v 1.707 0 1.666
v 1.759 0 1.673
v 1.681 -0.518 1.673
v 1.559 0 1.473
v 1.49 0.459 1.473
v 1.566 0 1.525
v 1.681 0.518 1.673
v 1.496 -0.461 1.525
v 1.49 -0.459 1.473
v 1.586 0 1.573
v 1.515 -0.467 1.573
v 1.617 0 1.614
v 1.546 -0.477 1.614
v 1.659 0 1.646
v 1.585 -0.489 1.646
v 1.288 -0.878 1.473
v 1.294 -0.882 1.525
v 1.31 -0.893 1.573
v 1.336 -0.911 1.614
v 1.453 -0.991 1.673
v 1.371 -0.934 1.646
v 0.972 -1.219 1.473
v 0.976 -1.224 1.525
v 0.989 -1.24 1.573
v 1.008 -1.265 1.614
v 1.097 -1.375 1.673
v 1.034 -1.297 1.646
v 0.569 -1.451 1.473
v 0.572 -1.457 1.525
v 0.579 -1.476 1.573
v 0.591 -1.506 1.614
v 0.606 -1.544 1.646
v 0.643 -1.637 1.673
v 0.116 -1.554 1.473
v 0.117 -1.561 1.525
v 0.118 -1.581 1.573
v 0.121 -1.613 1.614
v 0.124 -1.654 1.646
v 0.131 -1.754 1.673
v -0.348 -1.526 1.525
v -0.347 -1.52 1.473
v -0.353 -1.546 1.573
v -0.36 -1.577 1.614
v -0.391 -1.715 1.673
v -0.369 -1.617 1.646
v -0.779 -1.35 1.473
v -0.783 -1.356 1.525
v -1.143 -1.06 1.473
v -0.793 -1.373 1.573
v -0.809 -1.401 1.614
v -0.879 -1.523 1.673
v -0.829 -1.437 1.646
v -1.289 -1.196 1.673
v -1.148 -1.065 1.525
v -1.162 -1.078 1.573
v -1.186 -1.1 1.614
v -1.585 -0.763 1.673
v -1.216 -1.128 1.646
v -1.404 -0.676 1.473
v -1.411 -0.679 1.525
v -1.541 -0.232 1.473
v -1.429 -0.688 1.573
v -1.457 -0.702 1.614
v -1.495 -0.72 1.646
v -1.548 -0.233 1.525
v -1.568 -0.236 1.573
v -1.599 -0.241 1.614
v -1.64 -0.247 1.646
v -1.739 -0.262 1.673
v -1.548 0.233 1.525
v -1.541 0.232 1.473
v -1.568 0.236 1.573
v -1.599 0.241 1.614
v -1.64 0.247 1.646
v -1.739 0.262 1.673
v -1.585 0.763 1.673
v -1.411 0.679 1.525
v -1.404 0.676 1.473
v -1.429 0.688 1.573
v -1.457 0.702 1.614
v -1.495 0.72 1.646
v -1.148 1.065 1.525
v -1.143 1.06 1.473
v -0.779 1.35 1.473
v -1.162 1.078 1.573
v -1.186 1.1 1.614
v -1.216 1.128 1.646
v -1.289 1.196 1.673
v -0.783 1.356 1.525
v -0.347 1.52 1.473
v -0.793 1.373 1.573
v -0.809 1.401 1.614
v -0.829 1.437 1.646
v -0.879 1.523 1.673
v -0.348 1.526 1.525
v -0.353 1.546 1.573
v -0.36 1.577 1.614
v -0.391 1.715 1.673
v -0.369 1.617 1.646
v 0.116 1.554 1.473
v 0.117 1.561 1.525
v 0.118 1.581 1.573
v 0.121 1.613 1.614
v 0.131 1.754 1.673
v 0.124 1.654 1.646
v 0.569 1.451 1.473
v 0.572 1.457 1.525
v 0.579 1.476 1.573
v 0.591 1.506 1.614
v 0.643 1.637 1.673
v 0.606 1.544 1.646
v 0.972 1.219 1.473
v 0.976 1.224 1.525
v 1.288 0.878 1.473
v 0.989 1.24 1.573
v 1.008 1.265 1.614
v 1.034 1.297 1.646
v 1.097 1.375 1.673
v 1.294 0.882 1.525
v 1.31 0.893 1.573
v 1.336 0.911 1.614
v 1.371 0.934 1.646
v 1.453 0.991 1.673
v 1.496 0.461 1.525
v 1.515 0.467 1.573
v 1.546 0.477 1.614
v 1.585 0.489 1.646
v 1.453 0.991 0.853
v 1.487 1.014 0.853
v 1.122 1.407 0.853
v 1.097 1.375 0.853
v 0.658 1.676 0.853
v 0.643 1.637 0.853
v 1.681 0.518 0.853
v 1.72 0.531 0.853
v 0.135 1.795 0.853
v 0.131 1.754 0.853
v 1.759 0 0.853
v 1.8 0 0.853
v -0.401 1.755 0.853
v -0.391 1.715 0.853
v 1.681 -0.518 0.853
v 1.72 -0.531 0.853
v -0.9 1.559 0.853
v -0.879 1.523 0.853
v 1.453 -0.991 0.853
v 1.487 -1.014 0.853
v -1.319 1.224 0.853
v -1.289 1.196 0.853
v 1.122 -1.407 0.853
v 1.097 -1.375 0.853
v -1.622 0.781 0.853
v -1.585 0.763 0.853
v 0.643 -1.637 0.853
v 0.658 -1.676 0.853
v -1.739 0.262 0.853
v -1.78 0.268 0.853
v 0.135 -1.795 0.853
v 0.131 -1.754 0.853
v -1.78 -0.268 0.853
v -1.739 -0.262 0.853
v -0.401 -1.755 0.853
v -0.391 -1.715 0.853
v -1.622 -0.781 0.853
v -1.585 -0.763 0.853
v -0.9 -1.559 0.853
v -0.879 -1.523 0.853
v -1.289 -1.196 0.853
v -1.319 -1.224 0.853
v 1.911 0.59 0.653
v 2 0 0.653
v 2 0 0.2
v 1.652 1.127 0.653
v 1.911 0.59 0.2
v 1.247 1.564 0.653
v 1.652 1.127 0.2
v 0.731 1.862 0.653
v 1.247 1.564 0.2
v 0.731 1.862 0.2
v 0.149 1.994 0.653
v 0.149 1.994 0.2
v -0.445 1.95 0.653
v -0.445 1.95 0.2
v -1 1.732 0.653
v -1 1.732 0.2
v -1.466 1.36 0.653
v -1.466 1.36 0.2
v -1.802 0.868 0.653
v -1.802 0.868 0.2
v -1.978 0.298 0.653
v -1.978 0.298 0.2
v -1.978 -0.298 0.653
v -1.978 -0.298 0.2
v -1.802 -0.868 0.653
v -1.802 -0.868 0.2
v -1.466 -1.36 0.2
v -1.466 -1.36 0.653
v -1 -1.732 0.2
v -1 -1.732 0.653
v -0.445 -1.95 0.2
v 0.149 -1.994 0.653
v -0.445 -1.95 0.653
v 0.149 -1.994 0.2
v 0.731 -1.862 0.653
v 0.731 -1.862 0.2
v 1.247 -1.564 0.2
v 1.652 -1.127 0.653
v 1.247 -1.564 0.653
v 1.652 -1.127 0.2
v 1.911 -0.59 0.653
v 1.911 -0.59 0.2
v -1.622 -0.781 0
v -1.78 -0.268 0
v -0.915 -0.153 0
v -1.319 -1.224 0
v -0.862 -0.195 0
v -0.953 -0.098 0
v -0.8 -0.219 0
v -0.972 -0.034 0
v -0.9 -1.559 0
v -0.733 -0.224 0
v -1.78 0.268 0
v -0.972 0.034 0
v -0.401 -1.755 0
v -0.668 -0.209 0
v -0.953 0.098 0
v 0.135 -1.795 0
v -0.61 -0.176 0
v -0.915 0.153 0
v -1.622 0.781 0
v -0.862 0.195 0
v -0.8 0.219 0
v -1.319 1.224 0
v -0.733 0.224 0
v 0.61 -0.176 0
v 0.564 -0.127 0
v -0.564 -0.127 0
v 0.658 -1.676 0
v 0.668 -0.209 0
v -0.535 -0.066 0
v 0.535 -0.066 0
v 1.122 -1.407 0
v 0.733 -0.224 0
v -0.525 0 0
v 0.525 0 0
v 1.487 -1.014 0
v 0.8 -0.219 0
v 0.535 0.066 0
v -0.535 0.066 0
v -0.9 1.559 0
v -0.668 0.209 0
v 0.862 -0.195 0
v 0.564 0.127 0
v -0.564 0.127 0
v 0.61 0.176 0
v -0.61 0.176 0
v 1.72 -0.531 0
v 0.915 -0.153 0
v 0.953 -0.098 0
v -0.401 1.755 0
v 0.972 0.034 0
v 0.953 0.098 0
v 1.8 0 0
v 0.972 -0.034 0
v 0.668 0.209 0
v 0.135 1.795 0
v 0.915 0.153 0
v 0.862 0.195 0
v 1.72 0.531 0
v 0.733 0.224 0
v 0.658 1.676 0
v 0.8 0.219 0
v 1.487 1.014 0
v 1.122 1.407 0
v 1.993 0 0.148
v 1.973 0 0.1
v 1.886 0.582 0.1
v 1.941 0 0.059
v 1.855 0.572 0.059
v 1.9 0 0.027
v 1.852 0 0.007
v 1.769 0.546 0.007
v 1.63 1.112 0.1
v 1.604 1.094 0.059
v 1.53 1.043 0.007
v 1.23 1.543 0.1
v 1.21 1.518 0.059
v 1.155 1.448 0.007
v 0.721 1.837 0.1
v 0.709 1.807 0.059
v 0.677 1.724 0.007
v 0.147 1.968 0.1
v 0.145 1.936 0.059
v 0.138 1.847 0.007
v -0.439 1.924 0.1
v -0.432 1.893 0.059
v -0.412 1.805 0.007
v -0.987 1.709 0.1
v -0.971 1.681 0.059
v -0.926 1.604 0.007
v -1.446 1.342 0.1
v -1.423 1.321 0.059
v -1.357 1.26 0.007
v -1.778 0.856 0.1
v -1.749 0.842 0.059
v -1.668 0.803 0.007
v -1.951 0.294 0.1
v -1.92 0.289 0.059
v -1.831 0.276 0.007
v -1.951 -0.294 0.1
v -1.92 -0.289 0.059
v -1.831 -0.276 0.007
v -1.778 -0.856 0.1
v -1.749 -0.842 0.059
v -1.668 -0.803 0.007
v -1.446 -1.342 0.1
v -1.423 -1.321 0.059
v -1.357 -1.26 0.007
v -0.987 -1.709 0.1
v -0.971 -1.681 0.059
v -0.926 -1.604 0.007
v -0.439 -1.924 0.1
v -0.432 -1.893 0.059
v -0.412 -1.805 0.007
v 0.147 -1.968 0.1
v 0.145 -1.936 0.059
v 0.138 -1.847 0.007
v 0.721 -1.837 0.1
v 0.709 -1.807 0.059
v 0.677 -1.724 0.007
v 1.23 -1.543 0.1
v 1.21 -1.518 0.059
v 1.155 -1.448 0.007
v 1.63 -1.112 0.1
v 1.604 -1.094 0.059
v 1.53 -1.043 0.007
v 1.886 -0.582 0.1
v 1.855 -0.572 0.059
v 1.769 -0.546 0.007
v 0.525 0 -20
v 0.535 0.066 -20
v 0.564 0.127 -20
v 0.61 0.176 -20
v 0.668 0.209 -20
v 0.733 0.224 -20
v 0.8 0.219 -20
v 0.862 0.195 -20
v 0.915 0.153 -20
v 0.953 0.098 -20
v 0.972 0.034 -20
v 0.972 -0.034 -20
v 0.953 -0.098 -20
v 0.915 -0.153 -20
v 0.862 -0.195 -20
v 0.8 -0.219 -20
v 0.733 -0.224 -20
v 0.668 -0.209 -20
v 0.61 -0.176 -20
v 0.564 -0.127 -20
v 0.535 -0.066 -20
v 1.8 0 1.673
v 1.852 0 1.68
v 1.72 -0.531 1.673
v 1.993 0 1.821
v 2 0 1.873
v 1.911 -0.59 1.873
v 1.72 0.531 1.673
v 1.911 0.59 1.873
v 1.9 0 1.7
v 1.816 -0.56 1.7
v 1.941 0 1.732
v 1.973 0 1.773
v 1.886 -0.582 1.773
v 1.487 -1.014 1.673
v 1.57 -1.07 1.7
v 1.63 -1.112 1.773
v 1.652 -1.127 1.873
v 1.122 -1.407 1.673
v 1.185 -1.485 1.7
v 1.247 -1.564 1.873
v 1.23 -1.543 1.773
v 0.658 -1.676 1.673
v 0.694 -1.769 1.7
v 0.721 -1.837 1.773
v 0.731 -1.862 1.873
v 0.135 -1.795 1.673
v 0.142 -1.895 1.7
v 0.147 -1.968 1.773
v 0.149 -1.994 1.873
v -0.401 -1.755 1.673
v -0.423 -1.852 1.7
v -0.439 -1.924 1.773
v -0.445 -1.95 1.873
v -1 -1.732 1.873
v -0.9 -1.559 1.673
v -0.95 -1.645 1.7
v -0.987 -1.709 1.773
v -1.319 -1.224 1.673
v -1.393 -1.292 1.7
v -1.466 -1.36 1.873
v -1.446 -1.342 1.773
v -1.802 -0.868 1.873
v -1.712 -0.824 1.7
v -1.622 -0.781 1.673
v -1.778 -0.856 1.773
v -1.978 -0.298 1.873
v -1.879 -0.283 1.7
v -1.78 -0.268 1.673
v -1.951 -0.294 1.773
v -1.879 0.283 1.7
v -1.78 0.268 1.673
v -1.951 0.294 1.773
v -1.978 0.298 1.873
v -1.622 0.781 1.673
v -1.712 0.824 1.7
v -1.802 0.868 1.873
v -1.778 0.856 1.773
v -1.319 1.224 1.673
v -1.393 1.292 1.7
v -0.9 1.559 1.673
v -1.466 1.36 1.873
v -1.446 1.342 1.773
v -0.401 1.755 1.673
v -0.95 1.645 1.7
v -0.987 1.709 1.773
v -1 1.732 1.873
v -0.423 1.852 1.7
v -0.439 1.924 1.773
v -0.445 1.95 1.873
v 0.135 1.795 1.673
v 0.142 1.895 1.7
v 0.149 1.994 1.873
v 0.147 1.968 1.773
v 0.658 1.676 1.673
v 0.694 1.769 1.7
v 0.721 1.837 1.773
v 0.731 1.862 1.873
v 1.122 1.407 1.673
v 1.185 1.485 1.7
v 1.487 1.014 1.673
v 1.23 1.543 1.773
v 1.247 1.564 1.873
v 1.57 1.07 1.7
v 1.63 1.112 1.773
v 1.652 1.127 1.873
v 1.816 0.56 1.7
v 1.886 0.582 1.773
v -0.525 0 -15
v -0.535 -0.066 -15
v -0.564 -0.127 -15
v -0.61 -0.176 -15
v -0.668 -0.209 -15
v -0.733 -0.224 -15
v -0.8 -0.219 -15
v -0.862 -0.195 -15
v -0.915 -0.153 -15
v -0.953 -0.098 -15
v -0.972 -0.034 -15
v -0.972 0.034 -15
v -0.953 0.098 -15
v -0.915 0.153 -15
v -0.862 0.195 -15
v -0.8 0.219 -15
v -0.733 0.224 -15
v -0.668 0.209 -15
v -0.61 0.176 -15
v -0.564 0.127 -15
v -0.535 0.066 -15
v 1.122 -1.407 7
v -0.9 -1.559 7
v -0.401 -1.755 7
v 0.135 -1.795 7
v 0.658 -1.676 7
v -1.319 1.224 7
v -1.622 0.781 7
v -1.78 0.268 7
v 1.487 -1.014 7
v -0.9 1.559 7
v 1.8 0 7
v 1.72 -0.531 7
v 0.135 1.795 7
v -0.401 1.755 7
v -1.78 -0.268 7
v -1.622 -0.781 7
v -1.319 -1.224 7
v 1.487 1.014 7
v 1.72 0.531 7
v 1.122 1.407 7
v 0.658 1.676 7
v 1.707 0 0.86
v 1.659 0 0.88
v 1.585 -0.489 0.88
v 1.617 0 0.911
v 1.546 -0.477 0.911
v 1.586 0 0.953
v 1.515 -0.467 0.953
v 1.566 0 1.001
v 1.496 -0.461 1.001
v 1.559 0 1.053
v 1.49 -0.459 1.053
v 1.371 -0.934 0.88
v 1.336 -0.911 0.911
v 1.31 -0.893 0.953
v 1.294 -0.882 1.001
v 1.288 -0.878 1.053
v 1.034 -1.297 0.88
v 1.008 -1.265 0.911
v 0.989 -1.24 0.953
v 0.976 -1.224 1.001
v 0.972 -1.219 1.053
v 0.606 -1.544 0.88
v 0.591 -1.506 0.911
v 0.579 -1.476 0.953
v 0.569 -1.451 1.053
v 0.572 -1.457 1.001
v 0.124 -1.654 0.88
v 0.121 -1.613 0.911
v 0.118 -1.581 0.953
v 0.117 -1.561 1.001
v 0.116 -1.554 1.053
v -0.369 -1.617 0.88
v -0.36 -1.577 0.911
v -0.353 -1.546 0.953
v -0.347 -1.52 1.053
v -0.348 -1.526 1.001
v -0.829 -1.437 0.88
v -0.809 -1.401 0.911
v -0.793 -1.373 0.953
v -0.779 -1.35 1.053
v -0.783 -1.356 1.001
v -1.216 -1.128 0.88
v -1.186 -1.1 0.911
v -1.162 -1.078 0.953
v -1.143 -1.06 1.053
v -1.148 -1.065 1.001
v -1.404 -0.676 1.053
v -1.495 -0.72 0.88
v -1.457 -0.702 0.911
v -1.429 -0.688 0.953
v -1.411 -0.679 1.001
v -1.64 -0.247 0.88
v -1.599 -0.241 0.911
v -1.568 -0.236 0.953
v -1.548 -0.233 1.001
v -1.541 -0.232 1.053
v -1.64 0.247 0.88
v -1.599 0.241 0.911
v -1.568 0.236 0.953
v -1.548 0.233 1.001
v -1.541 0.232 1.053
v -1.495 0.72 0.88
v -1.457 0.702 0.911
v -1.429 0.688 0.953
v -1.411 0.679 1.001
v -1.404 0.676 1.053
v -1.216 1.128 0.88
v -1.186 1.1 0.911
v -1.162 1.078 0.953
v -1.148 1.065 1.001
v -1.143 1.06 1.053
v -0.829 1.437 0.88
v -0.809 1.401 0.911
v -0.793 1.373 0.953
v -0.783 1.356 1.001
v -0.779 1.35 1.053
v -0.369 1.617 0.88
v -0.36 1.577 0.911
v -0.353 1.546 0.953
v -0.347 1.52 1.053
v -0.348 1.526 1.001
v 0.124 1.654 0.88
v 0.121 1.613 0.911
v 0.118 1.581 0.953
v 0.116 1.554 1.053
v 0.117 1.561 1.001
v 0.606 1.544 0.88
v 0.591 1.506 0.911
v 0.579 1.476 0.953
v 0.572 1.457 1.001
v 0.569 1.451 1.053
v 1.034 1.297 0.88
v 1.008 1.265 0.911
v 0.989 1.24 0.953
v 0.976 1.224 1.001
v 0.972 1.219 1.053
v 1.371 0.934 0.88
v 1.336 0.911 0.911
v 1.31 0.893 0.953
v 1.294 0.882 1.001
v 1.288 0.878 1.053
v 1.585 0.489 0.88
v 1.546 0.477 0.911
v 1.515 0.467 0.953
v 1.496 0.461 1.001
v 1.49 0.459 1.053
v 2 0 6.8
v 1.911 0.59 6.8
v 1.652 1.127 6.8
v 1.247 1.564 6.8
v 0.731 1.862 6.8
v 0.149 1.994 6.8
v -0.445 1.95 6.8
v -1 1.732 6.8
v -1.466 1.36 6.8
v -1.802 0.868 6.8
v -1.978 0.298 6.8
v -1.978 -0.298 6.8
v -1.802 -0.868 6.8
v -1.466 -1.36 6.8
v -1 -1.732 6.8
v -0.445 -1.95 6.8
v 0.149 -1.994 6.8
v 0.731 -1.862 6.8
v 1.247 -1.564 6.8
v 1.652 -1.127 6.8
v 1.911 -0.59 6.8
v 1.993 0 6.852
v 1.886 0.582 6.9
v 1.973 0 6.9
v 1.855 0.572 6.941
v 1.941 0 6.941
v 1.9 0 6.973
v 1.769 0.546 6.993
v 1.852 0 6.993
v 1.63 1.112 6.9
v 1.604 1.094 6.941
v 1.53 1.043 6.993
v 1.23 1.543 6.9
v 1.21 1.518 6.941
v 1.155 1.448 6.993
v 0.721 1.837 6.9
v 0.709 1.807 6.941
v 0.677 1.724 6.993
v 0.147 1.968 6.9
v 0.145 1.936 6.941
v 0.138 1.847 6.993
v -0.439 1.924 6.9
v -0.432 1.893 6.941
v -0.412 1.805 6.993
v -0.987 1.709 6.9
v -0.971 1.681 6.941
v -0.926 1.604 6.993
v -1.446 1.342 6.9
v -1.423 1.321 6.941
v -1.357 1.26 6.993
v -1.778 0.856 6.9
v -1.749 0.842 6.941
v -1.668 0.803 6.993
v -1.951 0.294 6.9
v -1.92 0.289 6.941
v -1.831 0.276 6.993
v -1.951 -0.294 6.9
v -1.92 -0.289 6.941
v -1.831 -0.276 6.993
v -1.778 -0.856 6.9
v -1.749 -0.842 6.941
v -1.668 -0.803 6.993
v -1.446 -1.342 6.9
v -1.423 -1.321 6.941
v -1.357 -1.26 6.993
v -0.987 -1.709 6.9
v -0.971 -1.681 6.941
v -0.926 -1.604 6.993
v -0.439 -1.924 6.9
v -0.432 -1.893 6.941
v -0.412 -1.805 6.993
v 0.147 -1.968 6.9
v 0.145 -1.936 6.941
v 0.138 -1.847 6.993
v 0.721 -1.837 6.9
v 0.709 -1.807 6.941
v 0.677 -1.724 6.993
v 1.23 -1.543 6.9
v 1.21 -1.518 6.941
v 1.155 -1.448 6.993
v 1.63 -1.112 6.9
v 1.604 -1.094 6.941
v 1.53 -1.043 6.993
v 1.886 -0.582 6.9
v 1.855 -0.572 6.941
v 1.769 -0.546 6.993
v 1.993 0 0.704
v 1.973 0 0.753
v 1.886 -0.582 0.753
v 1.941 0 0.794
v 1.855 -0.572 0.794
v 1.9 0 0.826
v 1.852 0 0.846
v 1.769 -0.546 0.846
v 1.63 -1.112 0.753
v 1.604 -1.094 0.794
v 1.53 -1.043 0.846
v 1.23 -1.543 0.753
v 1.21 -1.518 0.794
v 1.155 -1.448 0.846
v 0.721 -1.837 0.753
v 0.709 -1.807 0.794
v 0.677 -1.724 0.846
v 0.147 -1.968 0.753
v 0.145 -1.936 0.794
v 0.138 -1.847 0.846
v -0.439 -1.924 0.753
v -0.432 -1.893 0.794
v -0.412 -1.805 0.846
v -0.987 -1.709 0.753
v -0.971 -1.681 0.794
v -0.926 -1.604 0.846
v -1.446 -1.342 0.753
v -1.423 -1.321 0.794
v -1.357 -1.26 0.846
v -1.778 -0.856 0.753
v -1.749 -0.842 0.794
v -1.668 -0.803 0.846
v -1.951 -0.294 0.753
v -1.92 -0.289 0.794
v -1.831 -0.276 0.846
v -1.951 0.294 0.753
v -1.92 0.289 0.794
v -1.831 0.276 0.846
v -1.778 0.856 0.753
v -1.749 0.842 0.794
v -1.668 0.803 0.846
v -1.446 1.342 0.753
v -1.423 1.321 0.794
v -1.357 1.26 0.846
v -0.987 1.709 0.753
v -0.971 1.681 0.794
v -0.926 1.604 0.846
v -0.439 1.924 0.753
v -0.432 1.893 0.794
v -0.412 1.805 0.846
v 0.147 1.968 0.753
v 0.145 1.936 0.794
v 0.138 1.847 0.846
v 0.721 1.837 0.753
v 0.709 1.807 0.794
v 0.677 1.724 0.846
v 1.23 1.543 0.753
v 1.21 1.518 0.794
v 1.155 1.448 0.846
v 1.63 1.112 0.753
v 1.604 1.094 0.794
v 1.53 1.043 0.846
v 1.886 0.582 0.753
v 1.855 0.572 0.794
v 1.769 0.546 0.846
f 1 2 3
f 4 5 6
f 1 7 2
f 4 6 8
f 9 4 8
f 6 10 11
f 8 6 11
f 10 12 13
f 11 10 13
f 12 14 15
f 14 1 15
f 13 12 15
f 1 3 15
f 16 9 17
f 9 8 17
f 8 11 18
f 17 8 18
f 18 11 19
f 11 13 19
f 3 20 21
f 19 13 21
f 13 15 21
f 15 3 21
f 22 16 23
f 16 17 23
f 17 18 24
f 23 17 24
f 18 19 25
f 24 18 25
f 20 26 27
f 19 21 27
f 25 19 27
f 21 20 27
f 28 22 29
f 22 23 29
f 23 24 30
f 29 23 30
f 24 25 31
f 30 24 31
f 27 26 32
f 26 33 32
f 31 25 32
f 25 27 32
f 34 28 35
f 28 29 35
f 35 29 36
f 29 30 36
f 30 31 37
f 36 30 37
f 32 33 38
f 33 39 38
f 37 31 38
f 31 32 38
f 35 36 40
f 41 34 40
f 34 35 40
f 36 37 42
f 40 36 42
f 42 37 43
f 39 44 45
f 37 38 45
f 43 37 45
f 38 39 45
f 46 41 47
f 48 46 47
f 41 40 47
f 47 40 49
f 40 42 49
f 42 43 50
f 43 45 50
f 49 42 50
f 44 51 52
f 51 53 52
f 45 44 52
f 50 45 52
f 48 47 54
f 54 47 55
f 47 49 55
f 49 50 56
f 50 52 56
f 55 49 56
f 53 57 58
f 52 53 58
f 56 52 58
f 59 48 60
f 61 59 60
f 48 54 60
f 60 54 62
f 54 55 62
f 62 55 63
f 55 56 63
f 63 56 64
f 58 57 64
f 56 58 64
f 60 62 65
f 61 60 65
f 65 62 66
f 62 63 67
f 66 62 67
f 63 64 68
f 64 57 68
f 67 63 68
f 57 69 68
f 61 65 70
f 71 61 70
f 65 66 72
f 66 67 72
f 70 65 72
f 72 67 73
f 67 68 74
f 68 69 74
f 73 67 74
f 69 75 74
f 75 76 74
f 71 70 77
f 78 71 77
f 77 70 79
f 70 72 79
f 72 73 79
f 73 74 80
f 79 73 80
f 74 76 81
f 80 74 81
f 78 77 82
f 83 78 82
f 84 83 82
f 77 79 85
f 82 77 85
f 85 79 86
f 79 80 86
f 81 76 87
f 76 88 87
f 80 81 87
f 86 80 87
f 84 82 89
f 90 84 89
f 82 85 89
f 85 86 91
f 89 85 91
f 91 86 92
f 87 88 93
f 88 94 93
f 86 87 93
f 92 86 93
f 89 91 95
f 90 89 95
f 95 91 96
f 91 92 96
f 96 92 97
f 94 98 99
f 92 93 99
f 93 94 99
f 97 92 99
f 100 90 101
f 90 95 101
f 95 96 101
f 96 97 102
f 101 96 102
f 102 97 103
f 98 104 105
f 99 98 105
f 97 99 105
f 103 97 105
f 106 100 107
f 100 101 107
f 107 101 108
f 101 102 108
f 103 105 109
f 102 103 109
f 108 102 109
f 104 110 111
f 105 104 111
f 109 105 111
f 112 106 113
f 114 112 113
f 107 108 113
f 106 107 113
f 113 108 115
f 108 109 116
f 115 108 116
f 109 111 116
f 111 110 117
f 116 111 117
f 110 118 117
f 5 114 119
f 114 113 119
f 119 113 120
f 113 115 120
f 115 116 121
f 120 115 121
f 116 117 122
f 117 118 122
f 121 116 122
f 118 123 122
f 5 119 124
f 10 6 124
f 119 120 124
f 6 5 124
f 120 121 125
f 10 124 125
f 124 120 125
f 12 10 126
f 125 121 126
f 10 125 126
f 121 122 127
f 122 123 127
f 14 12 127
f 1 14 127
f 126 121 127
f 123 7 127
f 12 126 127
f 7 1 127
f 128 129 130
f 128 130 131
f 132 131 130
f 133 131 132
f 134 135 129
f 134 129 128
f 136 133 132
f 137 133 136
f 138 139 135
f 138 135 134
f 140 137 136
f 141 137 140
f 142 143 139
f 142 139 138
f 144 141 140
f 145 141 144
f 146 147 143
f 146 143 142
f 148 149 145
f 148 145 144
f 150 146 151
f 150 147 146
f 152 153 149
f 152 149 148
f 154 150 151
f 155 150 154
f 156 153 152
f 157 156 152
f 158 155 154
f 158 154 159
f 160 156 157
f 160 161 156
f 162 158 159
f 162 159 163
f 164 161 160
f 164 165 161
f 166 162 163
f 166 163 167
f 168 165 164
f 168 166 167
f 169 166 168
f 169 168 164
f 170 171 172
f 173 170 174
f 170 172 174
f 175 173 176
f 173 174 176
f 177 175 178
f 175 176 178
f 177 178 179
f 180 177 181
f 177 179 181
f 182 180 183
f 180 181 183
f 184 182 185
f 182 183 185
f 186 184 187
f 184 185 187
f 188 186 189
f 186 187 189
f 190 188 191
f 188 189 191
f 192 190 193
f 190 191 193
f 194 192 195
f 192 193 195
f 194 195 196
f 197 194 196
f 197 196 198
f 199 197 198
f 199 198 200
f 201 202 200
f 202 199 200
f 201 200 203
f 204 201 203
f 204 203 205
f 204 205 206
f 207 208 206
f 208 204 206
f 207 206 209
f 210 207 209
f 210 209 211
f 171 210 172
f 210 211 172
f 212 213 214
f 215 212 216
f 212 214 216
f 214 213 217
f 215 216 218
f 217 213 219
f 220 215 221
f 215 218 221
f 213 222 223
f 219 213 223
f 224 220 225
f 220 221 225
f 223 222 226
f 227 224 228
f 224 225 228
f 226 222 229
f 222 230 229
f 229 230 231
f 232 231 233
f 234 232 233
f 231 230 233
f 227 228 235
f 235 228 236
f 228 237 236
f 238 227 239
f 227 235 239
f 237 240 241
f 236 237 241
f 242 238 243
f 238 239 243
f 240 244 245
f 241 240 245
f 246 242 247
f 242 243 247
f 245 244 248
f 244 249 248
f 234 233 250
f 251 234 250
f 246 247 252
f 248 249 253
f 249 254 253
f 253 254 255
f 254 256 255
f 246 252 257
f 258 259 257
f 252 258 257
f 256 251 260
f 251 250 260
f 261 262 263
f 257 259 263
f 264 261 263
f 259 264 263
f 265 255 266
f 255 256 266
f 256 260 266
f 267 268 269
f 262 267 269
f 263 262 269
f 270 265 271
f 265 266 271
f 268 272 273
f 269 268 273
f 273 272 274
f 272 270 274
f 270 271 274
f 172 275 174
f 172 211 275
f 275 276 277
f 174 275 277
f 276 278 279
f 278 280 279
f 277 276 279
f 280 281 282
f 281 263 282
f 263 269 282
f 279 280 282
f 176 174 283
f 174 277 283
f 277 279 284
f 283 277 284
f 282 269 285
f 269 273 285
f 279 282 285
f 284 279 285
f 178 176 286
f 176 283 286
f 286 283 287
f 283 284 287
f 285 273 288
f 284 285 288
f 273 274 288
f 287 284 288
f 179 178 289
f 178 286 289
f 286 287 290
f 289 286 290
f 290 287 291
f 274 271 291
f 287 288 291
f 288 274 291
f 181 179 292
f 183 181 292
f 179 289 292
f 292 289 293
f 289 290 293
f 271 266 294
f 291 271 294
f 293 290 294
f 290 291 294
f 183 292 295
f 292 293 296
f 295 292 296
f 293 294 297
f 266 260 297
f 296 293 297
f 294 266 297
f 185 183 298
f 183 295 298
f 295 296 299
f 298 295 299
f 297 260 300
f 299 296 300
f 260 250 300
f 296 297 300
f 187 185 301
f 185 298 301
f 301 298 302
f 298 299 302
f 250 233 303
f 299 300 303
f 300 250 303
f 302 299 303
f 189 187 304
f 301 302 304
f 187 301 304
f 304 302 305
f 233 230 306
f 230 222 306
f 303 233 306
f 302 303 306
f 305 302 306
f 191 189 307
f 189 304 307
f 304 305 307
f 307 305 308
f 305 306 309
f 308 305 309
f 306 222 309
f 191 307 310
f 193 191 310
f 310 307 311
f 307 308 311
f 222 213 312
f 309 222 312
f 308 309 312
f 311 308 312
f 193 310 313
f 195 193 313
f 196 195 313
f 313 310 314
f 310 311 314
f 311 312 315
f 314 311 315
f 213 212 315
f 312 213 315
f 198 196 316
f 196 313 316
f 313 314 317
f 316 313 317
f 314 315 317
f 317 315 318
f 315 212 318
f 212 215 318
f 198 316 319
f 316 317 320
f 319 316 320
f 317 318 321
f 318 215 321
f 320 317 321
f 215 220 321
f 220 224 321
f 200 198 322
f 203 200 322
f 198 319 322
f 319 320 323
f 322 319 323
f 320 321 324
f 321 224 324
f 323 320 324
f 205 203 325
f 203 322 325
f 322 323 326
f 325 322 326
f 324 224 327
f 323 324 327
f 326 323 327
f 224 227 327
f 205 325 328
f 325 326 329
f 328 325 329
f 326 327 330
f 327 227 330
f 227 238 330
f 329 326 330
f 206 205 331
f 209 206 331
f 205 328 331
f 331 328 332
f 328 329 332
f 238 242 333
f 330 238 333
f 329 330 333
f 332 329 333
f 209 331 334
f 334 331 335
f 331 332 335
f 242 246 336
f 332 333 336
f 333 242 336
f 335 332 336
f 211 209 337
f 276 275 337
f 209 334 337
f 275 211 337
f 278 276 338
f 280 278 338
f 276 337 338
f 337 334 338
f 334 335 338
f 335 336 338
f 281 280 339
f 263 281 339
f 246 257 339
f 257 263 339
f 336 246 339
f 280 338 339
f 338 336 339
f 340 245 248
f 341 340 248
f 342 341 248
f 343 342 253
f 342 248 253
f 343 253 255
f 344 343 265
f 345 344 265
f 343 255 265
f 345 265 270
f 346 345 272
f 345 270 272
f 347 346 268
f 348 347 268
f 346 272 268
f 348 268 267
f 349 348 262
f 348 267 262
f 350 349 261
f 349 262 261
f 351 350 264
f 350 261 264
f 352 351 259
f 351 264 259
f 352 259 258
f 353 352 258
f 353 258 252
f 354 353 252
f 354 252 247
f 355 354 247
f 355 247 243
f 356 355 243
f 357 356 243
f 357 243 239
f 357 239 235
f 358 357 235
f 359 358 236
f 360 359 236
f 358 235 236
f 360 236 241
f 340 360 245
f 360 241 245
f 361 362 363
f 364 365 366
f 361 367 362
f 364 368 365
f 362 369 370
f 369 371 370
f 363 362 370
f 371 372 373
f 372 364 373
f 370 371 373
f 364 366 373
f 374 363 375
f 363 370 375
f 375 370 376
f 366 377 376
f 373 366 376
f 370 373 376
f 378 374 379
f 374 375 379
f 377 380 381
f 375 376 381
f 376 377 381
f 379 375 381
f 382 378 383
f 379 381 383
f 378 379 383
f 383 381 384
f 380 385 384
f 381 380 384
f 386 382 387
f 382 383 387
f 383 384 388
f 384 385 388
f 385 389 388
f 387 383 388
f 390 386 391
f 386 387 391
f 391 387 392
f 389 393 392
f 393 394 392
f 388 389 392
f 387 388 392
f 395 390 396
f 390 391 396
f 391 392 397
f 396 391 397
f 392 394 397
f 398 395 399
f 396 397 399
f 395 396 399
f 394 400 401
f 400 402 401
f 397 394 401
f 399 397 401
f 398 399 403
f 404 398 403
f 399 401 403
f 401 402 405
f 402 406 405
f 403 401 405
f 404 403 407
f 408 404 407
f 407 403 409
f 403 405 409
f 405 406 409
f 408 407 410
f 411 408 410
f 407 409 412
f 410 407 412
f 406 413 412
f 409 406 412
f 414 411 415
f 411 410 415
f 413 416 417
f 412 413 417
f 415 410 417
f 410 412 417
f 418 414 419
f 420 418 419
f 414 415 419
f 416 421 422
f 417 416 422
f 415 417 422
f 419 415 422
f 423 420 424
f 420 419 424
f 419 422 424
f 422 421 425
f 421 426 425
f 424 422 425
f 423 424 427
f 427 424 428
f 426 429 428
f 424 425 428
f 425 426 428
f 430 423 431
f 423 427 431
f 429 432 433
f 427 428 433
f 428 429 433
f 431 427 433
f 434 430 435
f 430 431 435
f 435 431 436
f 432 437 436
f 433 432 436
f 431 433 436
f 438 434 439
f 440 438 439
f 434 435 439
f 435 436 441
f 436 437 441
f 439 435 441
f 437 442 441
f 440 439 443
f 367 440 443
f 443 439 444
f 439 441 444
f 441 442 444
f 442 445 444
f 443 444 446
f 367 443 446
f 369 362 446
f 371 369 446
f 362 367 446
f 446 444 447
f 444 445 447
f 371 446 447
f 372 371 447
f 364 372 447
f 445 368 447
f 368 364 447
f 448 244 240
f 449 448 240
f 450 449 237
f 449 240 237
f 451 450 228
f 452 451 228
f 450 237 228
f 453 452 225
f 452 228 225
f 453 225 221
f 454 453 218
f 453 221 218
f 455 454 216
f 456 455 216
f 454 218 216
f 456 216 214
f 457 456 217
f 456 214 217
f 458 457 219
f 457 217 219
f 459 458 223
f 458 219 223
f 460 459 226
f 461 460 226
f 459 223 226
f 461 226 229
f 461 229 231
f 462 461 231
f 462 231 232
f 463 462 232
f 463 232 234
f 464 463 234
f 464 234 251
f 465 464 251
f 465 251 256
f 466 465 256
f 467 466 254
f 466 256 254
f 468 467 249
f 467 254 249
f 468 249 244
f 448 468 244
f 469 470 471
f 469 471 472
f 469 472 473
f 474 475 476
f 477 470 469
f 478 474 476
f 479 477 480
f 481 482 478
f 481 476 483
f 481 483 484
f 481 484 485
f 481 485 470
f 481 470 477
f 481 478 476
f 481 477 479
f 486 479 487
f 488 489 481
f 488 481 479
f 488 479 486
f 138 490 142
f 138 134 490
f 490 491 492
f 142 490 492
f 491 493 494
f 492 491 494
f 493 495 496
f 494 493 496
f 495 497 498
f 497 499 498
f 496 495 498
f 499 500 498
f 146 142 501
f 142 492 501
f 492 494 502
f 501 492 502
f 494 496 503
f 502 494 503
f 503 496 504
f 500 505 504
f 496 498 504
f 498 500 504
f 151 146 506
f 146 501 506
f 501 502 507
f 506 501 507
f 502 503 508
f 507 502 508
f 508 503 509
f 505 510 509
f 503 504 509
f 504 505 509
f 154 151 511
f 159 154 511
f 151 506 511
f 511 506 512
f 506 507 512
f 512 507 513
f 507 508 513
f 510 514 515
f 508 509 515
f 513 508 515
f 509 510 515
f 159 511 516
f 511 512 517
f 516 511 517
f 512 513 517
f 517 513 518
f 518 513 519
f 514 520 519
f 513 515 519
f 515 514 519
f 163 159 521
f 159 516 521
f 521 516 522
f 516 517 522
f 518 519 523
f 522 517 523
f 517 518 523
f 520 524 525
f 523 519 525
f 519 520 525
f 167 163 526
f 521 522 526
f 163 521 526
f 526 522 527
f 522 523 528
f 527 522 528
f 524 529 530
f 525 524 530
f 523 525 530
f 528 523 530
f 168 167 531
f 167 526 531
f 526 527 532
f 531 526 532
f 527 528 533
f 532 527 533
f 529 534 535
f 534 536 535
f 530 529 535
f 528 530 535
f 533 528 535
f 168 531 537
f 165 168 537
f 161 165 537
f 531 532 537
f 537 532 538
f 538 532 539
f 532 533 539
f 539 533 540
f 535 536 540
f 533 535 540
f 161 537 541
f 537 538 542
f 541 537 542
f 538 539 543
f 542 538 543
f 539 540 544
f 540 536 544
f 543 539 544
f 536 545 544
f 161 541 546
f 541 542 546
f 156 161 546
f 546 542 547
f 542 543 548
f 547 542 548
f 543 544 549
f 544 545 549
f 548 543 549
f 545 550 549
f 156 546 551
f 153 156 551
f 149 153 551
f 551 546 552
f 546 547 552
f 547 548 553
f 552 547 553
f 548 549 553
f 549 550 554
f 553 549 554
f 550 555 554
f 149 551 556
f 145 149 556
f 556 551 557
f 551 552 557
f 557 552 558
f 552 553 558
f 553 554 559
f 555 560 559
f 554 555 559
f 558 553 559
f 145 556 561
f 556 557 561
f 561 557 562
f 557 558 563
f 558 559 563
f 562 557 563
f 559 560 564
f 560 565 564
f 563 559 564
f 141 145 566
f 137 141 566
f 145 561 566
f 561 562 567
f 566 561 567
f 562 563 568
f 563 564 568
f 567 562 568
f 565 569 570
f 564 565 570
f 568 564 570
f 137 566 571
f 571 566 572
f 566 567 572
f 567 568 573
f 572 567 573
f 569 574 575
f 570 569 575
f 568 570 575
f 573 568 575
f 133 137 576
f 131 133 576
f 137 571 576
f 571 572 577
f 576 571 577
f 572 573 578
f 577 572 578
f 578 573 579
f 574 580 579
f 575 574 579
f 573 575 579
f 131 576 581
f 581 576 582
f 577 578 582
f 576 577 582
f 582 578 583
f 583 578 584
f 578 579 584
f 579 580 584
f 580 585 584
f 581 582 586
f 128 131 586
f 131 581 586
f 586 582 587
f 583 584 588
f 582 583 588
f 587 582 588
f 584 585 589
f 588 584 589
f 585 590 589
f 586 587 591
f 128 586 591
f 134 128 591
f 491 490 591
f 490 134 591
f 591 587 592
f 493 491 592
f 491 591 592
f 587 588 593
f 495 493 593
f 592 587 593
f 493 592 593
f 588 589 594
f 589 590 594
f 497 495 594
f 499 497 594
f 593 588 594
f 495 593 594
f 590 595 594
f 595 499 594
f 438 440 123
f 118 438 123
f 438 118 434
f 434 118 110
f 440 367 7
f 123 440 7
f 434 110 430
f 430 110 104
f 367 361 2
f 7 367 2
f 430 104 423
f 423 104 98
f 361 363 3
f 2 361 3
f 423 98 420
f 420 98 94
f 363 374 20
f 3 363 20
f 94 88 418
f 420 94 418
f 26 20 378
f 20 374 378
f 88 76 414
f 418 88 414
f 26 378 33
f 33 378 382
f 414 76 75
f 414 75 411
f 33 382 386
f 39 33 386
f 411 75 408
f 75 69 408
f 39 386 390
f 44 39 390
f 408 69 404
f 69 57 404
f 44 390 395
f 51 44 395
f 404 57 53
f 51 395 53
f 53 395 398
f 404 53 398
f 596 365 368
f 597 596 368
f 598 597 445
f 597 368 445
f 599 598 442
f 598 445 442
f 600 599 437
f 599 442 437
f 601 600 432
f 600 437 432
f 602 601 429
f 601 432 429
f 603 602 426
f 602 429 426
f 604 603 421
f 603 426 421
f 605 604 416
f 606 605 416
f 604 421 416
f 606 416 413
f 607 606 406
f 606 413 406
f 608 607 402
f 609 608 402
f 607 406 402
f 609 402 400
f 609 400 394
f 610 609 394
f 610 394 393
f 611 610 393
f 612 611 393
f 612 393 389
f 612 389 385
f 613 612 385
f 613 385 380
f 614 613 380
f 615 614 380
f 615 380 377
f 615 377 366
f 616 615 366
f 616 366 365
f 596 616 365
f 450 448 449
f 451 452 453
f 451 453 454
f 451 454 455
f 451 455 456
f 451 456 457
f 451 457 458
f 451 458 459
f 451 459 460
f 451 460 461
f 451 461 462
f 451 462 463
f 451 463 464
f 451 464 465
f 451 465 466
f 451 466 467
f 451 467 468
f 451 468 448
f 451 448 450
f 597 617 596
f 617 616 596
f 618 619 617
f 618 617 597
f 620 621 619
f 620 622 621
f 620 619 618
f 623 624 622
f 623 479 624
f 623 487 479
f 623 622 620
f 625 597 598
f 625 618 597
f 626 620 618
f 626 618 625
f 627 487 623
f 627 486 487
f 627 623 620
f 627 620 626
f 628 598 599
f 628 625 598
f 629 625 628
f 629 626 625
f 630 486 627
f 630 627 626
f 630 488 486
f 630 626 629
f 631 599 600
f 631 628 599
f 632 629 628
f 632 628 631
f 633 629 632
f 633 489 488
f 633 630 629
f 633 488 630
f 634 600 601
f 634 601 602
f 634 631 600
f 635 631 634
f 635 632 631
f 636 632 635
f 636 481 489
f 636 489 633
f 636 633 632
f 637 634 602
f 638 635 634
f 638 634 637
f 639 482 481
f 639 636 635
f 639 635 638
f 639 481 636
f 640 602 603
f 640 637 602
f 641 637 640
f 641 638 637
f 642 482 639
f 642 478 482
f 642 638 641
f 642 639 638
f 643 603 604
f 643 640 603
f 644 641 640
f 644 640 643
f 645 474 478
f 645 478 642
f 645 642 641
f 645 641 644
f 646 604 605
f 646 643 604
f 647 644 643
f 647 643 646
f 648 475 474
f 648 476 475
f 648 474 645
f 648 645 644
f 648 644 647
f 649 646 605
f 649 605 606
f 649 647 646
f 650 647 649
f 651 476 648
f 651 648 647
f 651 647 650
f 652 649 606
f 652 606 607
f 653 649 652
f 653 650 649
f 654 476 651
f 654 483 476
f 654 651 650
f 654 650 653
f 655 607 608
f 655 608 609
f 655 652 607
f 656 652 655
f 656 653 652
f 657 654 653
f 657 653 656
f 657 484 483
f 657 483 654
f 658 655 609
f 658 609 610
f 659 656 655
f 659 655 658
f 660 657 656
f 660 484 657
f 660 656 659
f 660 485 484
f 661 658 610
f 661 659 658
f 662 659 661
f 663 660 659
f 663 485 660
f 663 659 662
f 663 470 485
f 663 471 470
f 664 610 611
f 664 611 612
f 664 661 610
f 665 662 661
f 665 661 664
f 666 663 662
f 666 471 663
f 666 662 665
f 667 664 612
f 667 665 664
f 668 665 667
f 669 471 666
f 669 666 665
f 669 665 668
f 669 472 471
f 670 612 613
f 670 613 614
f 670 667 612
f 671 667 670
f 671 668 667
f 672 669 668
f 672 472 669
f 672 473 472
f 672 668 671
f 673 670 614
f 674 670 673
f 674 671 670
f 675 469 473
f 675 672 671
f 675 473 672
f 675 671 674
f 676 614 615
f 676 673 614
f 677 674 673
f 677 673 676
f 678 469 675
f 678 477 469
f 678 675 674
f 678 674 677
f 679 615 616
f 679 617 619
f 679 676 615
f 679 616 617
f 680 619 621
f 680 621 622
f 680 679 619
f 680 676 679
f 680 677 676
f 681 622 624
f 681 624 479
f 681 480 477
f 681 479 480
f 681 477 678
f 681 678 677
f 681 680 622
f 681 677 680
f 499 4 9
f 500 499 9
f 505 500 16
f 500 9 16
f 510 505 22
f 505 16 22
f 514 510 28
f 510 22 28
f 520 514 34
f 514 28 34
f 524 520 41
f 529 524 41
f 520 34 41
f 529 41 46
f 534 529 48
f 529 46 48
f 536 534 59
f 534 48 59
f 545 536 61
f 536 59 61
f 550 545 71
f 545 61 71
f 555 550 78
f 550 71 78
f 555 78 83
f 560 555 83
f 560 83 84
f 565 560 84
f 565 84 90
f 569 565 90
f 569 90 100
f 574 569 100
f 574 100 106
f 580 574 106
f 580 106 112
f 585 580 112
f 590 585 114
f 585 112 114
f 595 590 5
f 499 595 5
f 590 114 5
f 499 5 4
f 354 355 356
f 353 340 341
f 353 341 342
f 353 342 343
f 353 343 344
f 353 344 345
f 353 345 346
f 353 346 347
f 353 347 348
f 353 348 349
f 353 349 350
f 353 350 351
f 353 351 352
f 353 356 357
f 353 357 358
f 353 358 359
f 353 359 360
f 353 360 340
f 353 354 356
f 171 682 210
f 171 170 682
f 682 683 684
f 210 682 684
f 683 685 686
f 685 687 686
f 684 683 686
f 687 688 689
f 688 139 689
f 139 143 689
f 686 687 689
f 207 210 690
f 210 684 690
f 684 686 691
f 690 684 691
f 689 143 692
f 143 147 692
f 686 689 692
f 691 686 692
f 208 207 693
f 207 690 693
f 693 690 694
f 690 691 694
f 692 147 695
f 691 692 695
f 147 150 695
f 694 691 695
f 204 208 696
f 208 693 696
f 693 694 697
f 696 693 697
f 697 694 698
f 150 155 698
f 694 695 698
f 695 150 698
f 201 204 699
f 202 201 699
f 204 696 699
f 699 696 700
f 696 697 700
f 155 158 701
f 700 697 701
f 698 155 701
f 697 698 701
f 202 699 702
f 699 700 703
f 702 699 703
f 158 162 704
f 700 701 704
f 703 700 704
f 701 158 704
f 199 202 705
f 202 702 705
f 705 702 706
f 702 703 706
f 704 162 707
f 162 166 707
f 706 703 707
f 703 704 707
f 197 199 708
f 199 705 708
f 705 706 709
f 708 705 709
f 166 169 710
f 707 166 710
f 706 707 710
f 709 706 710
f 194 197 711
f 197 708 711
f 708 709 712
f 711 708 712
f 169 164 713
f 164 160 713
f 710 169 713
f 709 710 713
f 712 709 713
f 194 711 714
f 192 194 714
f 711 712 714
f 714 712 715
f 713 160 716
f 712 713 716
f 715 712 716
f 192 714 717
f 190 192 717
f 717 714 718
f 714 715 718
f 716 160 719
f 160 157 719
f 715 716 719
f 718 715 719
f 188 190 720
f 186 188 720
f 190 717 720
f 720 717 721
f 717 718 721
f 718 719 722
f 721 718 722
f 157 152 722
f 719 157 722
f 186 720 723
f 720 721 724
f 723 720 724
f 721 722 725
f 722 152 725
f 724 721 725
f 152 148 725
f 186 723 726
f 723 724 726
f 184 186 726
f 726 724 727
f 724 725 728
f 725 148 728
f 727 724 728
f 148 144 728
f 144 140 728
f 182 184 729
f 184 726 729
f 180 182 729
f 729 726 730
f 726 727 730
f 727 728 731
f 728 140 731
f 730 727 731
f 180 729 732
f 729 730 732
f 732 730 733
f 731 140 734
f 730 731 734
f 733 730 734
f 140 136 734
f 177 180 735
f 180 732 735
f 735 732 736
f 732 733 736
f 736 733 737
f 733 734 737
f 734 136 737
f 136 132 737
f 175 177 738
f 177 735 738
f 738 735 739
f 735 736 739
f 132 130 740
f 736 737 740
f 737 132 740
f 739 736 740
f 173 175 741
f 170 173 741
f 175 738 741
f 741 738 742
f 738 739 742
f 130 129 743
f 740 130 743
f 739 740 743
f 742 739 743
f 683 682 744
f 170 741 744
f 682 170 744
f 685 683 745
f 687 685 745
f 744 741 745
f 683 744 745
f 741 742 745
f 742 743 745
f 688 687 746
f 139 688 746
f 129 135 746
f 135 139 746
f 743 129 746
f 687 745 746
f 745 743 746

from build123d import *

# Parameters (mm, degrees)
F0_R     = 2
F1_DEPTH = 7
F2_W     = 1.194575103
F2_H     = 0.820221263
F4_R     = 0.2
F5_R     = 0.225
F6_DEPTH = 15
F7_DEPTH = 20


with BuildPart() as f1:
    # F0 (on Top) → F1 (new body)
    with BuildSketch(Plane.XY):
        Circle(F0_R)
    extrude(amount=F1_DEPTH)

    # F2 (on Front) → F3 (revolve, cut)
    with BuildSketch(Plane.XZ):
        with Locations((2.1560959285, 1.2628298136)):
            Rectangle(F2_W, F2_H)
    revolve(axis=Axis((0, 0, 0), (0, 0, -1)), mode=Mode.SUBTRACT)

    # F4
    f4_edges = [f1.edges().sort_by_distance(p)[0] for p in [
        (-2, 0, 7),
        (-2, 0, 1.67294),
        (-1.558808, 0, 1.67294),
        (-2, 0, 0.852719),
        (-2, 0, 0),
        (-1.558808, 0, 0.852719),
    ]]
    fillet(f4_edges, radius=F4_R)

    # F5 (on face) → F6 (join)
    with BuildSketch(Plane(origin=(0, 0, 0), x_dir=(1, 0, 0), z_dir=(0, 0, -1))):
        with Locations((-0.75, 0)):
            Circle(F5_R)
    extrude(amount=F6_DEPTH)

    # F5 (on face) → F7 (join)
    with BuildSketch(Plane(origin=(0, 0, 0), x_dir=(1, 0, 0), z_dir=(0, 0, -1))):
        with BuildLine():
            ThreePointArc((0.975, 0), (0.75, 0.225), (0.525, 0))
            ThreePointArc((0.525, 0), (0.75, -0.225), (0.975, 0))
        make_face()
    extrude(amount=F7_DEPTH)


solid = f1.part
